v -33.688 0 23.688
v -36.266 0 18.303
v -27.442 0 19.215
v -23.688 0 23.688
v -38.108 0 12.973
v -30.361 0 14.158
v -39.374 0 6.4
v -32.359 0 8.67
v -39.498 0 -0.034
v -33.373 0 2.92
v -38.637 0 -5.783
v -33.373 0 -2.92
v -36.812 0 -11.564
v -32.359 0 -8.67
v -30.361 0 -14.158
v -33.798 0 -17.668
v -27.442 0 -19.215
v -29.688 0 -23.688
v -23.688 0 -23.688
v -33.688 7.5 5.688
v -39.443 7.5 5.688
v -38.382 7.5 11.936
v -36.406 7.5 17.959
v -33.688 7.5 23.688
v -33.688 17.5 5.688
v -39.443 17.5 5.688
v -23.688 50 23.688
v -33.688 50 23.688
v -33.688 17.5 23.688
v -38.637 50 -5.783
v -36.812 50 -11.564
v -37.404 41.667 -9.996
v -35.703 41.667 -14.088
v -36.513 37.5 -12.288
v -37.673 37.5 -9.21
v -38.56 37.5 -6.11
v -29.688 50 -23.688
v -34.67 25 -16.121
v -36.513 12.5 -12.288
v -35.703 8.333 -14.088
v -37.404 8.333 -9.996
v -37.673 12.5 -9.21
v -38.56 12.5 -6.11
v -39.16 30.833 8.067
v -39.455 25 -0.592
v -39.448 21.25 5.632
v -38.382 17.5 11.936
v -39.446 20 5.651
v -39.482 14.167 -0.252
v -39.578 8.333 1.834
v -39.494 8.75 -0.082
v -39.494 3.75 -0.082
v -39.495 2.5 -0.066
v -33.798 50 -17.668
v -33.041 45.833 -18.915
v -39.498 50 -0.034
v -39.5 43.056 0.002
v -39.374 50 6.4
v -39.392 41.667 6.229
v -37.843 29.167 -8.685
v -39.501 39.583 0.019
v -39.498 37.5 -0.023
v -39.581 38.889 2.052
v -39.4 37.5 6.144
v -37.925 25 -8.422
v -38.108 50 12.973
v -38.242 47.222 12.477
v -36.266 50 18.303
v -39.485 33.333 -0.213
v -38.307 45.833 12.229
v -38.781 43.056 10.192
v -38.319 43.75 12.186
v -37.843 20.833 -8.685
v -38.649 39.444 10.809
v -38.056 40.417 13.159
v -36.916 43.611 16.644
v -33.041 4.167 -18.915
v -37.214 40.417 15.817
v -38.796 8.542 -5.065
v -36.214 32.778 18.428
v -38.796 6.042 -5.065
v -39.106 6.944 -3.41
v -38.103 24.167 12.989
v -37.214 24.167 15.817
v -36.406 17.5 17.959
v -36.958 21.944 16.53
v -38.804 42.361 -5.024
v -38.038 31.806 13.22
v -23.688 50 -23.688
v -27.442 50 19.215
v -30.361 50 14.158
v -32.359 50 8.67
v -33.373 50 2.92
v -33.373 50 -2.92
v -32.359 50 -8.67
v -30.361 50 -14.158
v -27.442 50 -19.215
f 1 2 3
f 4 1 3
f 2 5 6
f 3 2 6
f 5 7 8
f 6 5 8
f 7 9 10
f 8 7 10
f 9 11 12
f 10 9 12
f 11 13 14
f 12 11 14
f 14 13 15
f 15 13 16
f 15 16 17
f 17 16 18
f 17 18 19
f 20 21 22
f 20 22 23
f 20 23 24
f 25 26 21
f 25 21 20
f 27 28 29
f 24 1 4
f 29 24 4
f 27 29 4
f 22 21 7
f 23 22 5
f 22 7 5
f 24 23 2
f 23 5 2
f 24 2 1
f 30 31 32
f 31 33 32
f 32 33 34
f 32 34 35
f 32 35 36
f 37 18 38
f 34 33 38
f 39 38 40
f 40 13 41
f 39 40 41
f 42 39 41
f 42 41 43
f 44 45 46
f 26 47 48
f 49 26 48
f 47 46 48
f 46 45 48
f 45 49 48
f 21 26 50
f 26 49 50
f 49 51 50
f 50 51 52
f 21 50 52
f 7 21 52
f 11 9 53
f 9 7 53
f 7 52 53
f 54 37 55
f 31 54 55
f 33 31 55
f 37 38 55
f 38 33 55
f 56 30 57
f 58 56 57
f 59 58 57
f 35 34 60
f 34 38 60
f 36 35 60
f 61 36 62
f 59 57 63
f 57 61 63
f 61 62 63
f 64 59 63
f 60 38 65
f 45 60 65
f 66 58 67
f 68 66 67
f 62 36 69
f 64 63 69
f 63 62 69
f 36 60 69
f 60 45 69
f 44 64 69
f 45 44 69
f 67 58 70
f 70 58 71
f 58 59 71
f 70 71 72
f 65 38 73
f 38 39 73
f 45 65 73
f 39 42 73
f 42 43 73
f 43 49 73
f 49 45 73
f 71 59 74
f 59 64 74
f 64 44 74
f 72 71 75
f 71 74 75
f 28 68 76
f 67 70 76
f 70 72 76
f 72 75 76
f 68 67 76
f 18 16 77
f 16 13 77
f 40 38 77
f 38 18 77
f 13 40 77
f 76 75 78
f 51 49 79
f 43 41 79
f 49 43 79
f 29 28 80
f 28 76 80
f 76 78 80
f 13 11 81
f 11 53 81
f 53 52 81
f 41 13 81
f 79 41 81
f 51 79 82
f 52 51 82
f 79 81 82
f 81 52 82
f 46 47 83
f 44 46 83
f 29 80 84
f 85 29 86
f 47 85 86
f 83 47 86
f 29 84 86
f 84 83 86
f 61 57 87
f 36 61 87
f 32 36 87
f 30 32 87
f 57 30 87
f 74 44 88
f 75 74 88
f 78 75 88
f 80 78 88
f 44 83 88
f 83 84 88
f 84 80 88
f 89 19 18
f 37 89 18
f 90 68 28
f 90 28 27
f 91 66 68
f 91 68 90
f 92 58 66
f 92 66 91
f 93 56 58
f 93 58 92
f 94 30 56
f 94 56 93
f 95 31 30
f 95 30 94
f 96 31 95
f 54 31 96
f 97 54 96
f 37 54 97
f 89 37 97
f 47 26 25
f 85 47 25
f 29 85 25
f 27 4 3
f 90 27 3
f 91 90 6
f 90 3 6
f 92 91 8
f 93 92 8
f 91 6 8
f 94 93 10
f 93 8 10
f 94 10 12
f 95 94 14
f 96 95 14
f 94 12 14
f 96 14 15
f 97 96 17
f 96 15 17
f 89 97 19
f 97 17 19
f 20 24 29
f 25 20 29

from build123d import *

# Parameters (mm, degrees)
BOSS_EXTRUDE1_DEPTH = 50
SKETCH3_W           = 8
SKETCH3_H           = 10
CUT_EXTRUDE5_DEPTH  = 18


with BuildPart() as part:
    # Sketch2 → Boss-Extrude1 (new body)
    with BuildSketch(Plane(origin=(0, 0, 0), x_dir=(1, 0, 0), z_dir=(0, 1, 0))):
        with BuildLine():
            ThreePointArc((-23.68807717, -23.68807717), (-33.5, 0), (-23.68807717, 23.68807717))
            Line((-23.68807717, 23.68807717), (-29.68807717, 23.68807717))
            add(Edge.make_bspline(
                [(-29.68807717, 23.68807717), (-47.221735333, 1.183613852), (-33.68807717, -23.68807717)],
                knots=[0, 0, 0, 1, 1, 1], degree=2))
            Line((-33.68807717, -23.68807717), (-23.68807717, -23.68807717))
        make_face()
    extrude(amount=BOSS_EXTRUDE1_DEPTH)

    # Sketch3 → Cut-Extrude5 (cut)
    with BuildSketch(Plane.XY.offset(23.68807717)):
        with Locations((-37.68807717, 12.5)):
            Rectangle(SKETCH3_W, SKETCH3_H)
    extrude(amount=-CUT_EXTRUDE5_DEPTH, mode=Mode.SUBTRACT)


solid = part.part
